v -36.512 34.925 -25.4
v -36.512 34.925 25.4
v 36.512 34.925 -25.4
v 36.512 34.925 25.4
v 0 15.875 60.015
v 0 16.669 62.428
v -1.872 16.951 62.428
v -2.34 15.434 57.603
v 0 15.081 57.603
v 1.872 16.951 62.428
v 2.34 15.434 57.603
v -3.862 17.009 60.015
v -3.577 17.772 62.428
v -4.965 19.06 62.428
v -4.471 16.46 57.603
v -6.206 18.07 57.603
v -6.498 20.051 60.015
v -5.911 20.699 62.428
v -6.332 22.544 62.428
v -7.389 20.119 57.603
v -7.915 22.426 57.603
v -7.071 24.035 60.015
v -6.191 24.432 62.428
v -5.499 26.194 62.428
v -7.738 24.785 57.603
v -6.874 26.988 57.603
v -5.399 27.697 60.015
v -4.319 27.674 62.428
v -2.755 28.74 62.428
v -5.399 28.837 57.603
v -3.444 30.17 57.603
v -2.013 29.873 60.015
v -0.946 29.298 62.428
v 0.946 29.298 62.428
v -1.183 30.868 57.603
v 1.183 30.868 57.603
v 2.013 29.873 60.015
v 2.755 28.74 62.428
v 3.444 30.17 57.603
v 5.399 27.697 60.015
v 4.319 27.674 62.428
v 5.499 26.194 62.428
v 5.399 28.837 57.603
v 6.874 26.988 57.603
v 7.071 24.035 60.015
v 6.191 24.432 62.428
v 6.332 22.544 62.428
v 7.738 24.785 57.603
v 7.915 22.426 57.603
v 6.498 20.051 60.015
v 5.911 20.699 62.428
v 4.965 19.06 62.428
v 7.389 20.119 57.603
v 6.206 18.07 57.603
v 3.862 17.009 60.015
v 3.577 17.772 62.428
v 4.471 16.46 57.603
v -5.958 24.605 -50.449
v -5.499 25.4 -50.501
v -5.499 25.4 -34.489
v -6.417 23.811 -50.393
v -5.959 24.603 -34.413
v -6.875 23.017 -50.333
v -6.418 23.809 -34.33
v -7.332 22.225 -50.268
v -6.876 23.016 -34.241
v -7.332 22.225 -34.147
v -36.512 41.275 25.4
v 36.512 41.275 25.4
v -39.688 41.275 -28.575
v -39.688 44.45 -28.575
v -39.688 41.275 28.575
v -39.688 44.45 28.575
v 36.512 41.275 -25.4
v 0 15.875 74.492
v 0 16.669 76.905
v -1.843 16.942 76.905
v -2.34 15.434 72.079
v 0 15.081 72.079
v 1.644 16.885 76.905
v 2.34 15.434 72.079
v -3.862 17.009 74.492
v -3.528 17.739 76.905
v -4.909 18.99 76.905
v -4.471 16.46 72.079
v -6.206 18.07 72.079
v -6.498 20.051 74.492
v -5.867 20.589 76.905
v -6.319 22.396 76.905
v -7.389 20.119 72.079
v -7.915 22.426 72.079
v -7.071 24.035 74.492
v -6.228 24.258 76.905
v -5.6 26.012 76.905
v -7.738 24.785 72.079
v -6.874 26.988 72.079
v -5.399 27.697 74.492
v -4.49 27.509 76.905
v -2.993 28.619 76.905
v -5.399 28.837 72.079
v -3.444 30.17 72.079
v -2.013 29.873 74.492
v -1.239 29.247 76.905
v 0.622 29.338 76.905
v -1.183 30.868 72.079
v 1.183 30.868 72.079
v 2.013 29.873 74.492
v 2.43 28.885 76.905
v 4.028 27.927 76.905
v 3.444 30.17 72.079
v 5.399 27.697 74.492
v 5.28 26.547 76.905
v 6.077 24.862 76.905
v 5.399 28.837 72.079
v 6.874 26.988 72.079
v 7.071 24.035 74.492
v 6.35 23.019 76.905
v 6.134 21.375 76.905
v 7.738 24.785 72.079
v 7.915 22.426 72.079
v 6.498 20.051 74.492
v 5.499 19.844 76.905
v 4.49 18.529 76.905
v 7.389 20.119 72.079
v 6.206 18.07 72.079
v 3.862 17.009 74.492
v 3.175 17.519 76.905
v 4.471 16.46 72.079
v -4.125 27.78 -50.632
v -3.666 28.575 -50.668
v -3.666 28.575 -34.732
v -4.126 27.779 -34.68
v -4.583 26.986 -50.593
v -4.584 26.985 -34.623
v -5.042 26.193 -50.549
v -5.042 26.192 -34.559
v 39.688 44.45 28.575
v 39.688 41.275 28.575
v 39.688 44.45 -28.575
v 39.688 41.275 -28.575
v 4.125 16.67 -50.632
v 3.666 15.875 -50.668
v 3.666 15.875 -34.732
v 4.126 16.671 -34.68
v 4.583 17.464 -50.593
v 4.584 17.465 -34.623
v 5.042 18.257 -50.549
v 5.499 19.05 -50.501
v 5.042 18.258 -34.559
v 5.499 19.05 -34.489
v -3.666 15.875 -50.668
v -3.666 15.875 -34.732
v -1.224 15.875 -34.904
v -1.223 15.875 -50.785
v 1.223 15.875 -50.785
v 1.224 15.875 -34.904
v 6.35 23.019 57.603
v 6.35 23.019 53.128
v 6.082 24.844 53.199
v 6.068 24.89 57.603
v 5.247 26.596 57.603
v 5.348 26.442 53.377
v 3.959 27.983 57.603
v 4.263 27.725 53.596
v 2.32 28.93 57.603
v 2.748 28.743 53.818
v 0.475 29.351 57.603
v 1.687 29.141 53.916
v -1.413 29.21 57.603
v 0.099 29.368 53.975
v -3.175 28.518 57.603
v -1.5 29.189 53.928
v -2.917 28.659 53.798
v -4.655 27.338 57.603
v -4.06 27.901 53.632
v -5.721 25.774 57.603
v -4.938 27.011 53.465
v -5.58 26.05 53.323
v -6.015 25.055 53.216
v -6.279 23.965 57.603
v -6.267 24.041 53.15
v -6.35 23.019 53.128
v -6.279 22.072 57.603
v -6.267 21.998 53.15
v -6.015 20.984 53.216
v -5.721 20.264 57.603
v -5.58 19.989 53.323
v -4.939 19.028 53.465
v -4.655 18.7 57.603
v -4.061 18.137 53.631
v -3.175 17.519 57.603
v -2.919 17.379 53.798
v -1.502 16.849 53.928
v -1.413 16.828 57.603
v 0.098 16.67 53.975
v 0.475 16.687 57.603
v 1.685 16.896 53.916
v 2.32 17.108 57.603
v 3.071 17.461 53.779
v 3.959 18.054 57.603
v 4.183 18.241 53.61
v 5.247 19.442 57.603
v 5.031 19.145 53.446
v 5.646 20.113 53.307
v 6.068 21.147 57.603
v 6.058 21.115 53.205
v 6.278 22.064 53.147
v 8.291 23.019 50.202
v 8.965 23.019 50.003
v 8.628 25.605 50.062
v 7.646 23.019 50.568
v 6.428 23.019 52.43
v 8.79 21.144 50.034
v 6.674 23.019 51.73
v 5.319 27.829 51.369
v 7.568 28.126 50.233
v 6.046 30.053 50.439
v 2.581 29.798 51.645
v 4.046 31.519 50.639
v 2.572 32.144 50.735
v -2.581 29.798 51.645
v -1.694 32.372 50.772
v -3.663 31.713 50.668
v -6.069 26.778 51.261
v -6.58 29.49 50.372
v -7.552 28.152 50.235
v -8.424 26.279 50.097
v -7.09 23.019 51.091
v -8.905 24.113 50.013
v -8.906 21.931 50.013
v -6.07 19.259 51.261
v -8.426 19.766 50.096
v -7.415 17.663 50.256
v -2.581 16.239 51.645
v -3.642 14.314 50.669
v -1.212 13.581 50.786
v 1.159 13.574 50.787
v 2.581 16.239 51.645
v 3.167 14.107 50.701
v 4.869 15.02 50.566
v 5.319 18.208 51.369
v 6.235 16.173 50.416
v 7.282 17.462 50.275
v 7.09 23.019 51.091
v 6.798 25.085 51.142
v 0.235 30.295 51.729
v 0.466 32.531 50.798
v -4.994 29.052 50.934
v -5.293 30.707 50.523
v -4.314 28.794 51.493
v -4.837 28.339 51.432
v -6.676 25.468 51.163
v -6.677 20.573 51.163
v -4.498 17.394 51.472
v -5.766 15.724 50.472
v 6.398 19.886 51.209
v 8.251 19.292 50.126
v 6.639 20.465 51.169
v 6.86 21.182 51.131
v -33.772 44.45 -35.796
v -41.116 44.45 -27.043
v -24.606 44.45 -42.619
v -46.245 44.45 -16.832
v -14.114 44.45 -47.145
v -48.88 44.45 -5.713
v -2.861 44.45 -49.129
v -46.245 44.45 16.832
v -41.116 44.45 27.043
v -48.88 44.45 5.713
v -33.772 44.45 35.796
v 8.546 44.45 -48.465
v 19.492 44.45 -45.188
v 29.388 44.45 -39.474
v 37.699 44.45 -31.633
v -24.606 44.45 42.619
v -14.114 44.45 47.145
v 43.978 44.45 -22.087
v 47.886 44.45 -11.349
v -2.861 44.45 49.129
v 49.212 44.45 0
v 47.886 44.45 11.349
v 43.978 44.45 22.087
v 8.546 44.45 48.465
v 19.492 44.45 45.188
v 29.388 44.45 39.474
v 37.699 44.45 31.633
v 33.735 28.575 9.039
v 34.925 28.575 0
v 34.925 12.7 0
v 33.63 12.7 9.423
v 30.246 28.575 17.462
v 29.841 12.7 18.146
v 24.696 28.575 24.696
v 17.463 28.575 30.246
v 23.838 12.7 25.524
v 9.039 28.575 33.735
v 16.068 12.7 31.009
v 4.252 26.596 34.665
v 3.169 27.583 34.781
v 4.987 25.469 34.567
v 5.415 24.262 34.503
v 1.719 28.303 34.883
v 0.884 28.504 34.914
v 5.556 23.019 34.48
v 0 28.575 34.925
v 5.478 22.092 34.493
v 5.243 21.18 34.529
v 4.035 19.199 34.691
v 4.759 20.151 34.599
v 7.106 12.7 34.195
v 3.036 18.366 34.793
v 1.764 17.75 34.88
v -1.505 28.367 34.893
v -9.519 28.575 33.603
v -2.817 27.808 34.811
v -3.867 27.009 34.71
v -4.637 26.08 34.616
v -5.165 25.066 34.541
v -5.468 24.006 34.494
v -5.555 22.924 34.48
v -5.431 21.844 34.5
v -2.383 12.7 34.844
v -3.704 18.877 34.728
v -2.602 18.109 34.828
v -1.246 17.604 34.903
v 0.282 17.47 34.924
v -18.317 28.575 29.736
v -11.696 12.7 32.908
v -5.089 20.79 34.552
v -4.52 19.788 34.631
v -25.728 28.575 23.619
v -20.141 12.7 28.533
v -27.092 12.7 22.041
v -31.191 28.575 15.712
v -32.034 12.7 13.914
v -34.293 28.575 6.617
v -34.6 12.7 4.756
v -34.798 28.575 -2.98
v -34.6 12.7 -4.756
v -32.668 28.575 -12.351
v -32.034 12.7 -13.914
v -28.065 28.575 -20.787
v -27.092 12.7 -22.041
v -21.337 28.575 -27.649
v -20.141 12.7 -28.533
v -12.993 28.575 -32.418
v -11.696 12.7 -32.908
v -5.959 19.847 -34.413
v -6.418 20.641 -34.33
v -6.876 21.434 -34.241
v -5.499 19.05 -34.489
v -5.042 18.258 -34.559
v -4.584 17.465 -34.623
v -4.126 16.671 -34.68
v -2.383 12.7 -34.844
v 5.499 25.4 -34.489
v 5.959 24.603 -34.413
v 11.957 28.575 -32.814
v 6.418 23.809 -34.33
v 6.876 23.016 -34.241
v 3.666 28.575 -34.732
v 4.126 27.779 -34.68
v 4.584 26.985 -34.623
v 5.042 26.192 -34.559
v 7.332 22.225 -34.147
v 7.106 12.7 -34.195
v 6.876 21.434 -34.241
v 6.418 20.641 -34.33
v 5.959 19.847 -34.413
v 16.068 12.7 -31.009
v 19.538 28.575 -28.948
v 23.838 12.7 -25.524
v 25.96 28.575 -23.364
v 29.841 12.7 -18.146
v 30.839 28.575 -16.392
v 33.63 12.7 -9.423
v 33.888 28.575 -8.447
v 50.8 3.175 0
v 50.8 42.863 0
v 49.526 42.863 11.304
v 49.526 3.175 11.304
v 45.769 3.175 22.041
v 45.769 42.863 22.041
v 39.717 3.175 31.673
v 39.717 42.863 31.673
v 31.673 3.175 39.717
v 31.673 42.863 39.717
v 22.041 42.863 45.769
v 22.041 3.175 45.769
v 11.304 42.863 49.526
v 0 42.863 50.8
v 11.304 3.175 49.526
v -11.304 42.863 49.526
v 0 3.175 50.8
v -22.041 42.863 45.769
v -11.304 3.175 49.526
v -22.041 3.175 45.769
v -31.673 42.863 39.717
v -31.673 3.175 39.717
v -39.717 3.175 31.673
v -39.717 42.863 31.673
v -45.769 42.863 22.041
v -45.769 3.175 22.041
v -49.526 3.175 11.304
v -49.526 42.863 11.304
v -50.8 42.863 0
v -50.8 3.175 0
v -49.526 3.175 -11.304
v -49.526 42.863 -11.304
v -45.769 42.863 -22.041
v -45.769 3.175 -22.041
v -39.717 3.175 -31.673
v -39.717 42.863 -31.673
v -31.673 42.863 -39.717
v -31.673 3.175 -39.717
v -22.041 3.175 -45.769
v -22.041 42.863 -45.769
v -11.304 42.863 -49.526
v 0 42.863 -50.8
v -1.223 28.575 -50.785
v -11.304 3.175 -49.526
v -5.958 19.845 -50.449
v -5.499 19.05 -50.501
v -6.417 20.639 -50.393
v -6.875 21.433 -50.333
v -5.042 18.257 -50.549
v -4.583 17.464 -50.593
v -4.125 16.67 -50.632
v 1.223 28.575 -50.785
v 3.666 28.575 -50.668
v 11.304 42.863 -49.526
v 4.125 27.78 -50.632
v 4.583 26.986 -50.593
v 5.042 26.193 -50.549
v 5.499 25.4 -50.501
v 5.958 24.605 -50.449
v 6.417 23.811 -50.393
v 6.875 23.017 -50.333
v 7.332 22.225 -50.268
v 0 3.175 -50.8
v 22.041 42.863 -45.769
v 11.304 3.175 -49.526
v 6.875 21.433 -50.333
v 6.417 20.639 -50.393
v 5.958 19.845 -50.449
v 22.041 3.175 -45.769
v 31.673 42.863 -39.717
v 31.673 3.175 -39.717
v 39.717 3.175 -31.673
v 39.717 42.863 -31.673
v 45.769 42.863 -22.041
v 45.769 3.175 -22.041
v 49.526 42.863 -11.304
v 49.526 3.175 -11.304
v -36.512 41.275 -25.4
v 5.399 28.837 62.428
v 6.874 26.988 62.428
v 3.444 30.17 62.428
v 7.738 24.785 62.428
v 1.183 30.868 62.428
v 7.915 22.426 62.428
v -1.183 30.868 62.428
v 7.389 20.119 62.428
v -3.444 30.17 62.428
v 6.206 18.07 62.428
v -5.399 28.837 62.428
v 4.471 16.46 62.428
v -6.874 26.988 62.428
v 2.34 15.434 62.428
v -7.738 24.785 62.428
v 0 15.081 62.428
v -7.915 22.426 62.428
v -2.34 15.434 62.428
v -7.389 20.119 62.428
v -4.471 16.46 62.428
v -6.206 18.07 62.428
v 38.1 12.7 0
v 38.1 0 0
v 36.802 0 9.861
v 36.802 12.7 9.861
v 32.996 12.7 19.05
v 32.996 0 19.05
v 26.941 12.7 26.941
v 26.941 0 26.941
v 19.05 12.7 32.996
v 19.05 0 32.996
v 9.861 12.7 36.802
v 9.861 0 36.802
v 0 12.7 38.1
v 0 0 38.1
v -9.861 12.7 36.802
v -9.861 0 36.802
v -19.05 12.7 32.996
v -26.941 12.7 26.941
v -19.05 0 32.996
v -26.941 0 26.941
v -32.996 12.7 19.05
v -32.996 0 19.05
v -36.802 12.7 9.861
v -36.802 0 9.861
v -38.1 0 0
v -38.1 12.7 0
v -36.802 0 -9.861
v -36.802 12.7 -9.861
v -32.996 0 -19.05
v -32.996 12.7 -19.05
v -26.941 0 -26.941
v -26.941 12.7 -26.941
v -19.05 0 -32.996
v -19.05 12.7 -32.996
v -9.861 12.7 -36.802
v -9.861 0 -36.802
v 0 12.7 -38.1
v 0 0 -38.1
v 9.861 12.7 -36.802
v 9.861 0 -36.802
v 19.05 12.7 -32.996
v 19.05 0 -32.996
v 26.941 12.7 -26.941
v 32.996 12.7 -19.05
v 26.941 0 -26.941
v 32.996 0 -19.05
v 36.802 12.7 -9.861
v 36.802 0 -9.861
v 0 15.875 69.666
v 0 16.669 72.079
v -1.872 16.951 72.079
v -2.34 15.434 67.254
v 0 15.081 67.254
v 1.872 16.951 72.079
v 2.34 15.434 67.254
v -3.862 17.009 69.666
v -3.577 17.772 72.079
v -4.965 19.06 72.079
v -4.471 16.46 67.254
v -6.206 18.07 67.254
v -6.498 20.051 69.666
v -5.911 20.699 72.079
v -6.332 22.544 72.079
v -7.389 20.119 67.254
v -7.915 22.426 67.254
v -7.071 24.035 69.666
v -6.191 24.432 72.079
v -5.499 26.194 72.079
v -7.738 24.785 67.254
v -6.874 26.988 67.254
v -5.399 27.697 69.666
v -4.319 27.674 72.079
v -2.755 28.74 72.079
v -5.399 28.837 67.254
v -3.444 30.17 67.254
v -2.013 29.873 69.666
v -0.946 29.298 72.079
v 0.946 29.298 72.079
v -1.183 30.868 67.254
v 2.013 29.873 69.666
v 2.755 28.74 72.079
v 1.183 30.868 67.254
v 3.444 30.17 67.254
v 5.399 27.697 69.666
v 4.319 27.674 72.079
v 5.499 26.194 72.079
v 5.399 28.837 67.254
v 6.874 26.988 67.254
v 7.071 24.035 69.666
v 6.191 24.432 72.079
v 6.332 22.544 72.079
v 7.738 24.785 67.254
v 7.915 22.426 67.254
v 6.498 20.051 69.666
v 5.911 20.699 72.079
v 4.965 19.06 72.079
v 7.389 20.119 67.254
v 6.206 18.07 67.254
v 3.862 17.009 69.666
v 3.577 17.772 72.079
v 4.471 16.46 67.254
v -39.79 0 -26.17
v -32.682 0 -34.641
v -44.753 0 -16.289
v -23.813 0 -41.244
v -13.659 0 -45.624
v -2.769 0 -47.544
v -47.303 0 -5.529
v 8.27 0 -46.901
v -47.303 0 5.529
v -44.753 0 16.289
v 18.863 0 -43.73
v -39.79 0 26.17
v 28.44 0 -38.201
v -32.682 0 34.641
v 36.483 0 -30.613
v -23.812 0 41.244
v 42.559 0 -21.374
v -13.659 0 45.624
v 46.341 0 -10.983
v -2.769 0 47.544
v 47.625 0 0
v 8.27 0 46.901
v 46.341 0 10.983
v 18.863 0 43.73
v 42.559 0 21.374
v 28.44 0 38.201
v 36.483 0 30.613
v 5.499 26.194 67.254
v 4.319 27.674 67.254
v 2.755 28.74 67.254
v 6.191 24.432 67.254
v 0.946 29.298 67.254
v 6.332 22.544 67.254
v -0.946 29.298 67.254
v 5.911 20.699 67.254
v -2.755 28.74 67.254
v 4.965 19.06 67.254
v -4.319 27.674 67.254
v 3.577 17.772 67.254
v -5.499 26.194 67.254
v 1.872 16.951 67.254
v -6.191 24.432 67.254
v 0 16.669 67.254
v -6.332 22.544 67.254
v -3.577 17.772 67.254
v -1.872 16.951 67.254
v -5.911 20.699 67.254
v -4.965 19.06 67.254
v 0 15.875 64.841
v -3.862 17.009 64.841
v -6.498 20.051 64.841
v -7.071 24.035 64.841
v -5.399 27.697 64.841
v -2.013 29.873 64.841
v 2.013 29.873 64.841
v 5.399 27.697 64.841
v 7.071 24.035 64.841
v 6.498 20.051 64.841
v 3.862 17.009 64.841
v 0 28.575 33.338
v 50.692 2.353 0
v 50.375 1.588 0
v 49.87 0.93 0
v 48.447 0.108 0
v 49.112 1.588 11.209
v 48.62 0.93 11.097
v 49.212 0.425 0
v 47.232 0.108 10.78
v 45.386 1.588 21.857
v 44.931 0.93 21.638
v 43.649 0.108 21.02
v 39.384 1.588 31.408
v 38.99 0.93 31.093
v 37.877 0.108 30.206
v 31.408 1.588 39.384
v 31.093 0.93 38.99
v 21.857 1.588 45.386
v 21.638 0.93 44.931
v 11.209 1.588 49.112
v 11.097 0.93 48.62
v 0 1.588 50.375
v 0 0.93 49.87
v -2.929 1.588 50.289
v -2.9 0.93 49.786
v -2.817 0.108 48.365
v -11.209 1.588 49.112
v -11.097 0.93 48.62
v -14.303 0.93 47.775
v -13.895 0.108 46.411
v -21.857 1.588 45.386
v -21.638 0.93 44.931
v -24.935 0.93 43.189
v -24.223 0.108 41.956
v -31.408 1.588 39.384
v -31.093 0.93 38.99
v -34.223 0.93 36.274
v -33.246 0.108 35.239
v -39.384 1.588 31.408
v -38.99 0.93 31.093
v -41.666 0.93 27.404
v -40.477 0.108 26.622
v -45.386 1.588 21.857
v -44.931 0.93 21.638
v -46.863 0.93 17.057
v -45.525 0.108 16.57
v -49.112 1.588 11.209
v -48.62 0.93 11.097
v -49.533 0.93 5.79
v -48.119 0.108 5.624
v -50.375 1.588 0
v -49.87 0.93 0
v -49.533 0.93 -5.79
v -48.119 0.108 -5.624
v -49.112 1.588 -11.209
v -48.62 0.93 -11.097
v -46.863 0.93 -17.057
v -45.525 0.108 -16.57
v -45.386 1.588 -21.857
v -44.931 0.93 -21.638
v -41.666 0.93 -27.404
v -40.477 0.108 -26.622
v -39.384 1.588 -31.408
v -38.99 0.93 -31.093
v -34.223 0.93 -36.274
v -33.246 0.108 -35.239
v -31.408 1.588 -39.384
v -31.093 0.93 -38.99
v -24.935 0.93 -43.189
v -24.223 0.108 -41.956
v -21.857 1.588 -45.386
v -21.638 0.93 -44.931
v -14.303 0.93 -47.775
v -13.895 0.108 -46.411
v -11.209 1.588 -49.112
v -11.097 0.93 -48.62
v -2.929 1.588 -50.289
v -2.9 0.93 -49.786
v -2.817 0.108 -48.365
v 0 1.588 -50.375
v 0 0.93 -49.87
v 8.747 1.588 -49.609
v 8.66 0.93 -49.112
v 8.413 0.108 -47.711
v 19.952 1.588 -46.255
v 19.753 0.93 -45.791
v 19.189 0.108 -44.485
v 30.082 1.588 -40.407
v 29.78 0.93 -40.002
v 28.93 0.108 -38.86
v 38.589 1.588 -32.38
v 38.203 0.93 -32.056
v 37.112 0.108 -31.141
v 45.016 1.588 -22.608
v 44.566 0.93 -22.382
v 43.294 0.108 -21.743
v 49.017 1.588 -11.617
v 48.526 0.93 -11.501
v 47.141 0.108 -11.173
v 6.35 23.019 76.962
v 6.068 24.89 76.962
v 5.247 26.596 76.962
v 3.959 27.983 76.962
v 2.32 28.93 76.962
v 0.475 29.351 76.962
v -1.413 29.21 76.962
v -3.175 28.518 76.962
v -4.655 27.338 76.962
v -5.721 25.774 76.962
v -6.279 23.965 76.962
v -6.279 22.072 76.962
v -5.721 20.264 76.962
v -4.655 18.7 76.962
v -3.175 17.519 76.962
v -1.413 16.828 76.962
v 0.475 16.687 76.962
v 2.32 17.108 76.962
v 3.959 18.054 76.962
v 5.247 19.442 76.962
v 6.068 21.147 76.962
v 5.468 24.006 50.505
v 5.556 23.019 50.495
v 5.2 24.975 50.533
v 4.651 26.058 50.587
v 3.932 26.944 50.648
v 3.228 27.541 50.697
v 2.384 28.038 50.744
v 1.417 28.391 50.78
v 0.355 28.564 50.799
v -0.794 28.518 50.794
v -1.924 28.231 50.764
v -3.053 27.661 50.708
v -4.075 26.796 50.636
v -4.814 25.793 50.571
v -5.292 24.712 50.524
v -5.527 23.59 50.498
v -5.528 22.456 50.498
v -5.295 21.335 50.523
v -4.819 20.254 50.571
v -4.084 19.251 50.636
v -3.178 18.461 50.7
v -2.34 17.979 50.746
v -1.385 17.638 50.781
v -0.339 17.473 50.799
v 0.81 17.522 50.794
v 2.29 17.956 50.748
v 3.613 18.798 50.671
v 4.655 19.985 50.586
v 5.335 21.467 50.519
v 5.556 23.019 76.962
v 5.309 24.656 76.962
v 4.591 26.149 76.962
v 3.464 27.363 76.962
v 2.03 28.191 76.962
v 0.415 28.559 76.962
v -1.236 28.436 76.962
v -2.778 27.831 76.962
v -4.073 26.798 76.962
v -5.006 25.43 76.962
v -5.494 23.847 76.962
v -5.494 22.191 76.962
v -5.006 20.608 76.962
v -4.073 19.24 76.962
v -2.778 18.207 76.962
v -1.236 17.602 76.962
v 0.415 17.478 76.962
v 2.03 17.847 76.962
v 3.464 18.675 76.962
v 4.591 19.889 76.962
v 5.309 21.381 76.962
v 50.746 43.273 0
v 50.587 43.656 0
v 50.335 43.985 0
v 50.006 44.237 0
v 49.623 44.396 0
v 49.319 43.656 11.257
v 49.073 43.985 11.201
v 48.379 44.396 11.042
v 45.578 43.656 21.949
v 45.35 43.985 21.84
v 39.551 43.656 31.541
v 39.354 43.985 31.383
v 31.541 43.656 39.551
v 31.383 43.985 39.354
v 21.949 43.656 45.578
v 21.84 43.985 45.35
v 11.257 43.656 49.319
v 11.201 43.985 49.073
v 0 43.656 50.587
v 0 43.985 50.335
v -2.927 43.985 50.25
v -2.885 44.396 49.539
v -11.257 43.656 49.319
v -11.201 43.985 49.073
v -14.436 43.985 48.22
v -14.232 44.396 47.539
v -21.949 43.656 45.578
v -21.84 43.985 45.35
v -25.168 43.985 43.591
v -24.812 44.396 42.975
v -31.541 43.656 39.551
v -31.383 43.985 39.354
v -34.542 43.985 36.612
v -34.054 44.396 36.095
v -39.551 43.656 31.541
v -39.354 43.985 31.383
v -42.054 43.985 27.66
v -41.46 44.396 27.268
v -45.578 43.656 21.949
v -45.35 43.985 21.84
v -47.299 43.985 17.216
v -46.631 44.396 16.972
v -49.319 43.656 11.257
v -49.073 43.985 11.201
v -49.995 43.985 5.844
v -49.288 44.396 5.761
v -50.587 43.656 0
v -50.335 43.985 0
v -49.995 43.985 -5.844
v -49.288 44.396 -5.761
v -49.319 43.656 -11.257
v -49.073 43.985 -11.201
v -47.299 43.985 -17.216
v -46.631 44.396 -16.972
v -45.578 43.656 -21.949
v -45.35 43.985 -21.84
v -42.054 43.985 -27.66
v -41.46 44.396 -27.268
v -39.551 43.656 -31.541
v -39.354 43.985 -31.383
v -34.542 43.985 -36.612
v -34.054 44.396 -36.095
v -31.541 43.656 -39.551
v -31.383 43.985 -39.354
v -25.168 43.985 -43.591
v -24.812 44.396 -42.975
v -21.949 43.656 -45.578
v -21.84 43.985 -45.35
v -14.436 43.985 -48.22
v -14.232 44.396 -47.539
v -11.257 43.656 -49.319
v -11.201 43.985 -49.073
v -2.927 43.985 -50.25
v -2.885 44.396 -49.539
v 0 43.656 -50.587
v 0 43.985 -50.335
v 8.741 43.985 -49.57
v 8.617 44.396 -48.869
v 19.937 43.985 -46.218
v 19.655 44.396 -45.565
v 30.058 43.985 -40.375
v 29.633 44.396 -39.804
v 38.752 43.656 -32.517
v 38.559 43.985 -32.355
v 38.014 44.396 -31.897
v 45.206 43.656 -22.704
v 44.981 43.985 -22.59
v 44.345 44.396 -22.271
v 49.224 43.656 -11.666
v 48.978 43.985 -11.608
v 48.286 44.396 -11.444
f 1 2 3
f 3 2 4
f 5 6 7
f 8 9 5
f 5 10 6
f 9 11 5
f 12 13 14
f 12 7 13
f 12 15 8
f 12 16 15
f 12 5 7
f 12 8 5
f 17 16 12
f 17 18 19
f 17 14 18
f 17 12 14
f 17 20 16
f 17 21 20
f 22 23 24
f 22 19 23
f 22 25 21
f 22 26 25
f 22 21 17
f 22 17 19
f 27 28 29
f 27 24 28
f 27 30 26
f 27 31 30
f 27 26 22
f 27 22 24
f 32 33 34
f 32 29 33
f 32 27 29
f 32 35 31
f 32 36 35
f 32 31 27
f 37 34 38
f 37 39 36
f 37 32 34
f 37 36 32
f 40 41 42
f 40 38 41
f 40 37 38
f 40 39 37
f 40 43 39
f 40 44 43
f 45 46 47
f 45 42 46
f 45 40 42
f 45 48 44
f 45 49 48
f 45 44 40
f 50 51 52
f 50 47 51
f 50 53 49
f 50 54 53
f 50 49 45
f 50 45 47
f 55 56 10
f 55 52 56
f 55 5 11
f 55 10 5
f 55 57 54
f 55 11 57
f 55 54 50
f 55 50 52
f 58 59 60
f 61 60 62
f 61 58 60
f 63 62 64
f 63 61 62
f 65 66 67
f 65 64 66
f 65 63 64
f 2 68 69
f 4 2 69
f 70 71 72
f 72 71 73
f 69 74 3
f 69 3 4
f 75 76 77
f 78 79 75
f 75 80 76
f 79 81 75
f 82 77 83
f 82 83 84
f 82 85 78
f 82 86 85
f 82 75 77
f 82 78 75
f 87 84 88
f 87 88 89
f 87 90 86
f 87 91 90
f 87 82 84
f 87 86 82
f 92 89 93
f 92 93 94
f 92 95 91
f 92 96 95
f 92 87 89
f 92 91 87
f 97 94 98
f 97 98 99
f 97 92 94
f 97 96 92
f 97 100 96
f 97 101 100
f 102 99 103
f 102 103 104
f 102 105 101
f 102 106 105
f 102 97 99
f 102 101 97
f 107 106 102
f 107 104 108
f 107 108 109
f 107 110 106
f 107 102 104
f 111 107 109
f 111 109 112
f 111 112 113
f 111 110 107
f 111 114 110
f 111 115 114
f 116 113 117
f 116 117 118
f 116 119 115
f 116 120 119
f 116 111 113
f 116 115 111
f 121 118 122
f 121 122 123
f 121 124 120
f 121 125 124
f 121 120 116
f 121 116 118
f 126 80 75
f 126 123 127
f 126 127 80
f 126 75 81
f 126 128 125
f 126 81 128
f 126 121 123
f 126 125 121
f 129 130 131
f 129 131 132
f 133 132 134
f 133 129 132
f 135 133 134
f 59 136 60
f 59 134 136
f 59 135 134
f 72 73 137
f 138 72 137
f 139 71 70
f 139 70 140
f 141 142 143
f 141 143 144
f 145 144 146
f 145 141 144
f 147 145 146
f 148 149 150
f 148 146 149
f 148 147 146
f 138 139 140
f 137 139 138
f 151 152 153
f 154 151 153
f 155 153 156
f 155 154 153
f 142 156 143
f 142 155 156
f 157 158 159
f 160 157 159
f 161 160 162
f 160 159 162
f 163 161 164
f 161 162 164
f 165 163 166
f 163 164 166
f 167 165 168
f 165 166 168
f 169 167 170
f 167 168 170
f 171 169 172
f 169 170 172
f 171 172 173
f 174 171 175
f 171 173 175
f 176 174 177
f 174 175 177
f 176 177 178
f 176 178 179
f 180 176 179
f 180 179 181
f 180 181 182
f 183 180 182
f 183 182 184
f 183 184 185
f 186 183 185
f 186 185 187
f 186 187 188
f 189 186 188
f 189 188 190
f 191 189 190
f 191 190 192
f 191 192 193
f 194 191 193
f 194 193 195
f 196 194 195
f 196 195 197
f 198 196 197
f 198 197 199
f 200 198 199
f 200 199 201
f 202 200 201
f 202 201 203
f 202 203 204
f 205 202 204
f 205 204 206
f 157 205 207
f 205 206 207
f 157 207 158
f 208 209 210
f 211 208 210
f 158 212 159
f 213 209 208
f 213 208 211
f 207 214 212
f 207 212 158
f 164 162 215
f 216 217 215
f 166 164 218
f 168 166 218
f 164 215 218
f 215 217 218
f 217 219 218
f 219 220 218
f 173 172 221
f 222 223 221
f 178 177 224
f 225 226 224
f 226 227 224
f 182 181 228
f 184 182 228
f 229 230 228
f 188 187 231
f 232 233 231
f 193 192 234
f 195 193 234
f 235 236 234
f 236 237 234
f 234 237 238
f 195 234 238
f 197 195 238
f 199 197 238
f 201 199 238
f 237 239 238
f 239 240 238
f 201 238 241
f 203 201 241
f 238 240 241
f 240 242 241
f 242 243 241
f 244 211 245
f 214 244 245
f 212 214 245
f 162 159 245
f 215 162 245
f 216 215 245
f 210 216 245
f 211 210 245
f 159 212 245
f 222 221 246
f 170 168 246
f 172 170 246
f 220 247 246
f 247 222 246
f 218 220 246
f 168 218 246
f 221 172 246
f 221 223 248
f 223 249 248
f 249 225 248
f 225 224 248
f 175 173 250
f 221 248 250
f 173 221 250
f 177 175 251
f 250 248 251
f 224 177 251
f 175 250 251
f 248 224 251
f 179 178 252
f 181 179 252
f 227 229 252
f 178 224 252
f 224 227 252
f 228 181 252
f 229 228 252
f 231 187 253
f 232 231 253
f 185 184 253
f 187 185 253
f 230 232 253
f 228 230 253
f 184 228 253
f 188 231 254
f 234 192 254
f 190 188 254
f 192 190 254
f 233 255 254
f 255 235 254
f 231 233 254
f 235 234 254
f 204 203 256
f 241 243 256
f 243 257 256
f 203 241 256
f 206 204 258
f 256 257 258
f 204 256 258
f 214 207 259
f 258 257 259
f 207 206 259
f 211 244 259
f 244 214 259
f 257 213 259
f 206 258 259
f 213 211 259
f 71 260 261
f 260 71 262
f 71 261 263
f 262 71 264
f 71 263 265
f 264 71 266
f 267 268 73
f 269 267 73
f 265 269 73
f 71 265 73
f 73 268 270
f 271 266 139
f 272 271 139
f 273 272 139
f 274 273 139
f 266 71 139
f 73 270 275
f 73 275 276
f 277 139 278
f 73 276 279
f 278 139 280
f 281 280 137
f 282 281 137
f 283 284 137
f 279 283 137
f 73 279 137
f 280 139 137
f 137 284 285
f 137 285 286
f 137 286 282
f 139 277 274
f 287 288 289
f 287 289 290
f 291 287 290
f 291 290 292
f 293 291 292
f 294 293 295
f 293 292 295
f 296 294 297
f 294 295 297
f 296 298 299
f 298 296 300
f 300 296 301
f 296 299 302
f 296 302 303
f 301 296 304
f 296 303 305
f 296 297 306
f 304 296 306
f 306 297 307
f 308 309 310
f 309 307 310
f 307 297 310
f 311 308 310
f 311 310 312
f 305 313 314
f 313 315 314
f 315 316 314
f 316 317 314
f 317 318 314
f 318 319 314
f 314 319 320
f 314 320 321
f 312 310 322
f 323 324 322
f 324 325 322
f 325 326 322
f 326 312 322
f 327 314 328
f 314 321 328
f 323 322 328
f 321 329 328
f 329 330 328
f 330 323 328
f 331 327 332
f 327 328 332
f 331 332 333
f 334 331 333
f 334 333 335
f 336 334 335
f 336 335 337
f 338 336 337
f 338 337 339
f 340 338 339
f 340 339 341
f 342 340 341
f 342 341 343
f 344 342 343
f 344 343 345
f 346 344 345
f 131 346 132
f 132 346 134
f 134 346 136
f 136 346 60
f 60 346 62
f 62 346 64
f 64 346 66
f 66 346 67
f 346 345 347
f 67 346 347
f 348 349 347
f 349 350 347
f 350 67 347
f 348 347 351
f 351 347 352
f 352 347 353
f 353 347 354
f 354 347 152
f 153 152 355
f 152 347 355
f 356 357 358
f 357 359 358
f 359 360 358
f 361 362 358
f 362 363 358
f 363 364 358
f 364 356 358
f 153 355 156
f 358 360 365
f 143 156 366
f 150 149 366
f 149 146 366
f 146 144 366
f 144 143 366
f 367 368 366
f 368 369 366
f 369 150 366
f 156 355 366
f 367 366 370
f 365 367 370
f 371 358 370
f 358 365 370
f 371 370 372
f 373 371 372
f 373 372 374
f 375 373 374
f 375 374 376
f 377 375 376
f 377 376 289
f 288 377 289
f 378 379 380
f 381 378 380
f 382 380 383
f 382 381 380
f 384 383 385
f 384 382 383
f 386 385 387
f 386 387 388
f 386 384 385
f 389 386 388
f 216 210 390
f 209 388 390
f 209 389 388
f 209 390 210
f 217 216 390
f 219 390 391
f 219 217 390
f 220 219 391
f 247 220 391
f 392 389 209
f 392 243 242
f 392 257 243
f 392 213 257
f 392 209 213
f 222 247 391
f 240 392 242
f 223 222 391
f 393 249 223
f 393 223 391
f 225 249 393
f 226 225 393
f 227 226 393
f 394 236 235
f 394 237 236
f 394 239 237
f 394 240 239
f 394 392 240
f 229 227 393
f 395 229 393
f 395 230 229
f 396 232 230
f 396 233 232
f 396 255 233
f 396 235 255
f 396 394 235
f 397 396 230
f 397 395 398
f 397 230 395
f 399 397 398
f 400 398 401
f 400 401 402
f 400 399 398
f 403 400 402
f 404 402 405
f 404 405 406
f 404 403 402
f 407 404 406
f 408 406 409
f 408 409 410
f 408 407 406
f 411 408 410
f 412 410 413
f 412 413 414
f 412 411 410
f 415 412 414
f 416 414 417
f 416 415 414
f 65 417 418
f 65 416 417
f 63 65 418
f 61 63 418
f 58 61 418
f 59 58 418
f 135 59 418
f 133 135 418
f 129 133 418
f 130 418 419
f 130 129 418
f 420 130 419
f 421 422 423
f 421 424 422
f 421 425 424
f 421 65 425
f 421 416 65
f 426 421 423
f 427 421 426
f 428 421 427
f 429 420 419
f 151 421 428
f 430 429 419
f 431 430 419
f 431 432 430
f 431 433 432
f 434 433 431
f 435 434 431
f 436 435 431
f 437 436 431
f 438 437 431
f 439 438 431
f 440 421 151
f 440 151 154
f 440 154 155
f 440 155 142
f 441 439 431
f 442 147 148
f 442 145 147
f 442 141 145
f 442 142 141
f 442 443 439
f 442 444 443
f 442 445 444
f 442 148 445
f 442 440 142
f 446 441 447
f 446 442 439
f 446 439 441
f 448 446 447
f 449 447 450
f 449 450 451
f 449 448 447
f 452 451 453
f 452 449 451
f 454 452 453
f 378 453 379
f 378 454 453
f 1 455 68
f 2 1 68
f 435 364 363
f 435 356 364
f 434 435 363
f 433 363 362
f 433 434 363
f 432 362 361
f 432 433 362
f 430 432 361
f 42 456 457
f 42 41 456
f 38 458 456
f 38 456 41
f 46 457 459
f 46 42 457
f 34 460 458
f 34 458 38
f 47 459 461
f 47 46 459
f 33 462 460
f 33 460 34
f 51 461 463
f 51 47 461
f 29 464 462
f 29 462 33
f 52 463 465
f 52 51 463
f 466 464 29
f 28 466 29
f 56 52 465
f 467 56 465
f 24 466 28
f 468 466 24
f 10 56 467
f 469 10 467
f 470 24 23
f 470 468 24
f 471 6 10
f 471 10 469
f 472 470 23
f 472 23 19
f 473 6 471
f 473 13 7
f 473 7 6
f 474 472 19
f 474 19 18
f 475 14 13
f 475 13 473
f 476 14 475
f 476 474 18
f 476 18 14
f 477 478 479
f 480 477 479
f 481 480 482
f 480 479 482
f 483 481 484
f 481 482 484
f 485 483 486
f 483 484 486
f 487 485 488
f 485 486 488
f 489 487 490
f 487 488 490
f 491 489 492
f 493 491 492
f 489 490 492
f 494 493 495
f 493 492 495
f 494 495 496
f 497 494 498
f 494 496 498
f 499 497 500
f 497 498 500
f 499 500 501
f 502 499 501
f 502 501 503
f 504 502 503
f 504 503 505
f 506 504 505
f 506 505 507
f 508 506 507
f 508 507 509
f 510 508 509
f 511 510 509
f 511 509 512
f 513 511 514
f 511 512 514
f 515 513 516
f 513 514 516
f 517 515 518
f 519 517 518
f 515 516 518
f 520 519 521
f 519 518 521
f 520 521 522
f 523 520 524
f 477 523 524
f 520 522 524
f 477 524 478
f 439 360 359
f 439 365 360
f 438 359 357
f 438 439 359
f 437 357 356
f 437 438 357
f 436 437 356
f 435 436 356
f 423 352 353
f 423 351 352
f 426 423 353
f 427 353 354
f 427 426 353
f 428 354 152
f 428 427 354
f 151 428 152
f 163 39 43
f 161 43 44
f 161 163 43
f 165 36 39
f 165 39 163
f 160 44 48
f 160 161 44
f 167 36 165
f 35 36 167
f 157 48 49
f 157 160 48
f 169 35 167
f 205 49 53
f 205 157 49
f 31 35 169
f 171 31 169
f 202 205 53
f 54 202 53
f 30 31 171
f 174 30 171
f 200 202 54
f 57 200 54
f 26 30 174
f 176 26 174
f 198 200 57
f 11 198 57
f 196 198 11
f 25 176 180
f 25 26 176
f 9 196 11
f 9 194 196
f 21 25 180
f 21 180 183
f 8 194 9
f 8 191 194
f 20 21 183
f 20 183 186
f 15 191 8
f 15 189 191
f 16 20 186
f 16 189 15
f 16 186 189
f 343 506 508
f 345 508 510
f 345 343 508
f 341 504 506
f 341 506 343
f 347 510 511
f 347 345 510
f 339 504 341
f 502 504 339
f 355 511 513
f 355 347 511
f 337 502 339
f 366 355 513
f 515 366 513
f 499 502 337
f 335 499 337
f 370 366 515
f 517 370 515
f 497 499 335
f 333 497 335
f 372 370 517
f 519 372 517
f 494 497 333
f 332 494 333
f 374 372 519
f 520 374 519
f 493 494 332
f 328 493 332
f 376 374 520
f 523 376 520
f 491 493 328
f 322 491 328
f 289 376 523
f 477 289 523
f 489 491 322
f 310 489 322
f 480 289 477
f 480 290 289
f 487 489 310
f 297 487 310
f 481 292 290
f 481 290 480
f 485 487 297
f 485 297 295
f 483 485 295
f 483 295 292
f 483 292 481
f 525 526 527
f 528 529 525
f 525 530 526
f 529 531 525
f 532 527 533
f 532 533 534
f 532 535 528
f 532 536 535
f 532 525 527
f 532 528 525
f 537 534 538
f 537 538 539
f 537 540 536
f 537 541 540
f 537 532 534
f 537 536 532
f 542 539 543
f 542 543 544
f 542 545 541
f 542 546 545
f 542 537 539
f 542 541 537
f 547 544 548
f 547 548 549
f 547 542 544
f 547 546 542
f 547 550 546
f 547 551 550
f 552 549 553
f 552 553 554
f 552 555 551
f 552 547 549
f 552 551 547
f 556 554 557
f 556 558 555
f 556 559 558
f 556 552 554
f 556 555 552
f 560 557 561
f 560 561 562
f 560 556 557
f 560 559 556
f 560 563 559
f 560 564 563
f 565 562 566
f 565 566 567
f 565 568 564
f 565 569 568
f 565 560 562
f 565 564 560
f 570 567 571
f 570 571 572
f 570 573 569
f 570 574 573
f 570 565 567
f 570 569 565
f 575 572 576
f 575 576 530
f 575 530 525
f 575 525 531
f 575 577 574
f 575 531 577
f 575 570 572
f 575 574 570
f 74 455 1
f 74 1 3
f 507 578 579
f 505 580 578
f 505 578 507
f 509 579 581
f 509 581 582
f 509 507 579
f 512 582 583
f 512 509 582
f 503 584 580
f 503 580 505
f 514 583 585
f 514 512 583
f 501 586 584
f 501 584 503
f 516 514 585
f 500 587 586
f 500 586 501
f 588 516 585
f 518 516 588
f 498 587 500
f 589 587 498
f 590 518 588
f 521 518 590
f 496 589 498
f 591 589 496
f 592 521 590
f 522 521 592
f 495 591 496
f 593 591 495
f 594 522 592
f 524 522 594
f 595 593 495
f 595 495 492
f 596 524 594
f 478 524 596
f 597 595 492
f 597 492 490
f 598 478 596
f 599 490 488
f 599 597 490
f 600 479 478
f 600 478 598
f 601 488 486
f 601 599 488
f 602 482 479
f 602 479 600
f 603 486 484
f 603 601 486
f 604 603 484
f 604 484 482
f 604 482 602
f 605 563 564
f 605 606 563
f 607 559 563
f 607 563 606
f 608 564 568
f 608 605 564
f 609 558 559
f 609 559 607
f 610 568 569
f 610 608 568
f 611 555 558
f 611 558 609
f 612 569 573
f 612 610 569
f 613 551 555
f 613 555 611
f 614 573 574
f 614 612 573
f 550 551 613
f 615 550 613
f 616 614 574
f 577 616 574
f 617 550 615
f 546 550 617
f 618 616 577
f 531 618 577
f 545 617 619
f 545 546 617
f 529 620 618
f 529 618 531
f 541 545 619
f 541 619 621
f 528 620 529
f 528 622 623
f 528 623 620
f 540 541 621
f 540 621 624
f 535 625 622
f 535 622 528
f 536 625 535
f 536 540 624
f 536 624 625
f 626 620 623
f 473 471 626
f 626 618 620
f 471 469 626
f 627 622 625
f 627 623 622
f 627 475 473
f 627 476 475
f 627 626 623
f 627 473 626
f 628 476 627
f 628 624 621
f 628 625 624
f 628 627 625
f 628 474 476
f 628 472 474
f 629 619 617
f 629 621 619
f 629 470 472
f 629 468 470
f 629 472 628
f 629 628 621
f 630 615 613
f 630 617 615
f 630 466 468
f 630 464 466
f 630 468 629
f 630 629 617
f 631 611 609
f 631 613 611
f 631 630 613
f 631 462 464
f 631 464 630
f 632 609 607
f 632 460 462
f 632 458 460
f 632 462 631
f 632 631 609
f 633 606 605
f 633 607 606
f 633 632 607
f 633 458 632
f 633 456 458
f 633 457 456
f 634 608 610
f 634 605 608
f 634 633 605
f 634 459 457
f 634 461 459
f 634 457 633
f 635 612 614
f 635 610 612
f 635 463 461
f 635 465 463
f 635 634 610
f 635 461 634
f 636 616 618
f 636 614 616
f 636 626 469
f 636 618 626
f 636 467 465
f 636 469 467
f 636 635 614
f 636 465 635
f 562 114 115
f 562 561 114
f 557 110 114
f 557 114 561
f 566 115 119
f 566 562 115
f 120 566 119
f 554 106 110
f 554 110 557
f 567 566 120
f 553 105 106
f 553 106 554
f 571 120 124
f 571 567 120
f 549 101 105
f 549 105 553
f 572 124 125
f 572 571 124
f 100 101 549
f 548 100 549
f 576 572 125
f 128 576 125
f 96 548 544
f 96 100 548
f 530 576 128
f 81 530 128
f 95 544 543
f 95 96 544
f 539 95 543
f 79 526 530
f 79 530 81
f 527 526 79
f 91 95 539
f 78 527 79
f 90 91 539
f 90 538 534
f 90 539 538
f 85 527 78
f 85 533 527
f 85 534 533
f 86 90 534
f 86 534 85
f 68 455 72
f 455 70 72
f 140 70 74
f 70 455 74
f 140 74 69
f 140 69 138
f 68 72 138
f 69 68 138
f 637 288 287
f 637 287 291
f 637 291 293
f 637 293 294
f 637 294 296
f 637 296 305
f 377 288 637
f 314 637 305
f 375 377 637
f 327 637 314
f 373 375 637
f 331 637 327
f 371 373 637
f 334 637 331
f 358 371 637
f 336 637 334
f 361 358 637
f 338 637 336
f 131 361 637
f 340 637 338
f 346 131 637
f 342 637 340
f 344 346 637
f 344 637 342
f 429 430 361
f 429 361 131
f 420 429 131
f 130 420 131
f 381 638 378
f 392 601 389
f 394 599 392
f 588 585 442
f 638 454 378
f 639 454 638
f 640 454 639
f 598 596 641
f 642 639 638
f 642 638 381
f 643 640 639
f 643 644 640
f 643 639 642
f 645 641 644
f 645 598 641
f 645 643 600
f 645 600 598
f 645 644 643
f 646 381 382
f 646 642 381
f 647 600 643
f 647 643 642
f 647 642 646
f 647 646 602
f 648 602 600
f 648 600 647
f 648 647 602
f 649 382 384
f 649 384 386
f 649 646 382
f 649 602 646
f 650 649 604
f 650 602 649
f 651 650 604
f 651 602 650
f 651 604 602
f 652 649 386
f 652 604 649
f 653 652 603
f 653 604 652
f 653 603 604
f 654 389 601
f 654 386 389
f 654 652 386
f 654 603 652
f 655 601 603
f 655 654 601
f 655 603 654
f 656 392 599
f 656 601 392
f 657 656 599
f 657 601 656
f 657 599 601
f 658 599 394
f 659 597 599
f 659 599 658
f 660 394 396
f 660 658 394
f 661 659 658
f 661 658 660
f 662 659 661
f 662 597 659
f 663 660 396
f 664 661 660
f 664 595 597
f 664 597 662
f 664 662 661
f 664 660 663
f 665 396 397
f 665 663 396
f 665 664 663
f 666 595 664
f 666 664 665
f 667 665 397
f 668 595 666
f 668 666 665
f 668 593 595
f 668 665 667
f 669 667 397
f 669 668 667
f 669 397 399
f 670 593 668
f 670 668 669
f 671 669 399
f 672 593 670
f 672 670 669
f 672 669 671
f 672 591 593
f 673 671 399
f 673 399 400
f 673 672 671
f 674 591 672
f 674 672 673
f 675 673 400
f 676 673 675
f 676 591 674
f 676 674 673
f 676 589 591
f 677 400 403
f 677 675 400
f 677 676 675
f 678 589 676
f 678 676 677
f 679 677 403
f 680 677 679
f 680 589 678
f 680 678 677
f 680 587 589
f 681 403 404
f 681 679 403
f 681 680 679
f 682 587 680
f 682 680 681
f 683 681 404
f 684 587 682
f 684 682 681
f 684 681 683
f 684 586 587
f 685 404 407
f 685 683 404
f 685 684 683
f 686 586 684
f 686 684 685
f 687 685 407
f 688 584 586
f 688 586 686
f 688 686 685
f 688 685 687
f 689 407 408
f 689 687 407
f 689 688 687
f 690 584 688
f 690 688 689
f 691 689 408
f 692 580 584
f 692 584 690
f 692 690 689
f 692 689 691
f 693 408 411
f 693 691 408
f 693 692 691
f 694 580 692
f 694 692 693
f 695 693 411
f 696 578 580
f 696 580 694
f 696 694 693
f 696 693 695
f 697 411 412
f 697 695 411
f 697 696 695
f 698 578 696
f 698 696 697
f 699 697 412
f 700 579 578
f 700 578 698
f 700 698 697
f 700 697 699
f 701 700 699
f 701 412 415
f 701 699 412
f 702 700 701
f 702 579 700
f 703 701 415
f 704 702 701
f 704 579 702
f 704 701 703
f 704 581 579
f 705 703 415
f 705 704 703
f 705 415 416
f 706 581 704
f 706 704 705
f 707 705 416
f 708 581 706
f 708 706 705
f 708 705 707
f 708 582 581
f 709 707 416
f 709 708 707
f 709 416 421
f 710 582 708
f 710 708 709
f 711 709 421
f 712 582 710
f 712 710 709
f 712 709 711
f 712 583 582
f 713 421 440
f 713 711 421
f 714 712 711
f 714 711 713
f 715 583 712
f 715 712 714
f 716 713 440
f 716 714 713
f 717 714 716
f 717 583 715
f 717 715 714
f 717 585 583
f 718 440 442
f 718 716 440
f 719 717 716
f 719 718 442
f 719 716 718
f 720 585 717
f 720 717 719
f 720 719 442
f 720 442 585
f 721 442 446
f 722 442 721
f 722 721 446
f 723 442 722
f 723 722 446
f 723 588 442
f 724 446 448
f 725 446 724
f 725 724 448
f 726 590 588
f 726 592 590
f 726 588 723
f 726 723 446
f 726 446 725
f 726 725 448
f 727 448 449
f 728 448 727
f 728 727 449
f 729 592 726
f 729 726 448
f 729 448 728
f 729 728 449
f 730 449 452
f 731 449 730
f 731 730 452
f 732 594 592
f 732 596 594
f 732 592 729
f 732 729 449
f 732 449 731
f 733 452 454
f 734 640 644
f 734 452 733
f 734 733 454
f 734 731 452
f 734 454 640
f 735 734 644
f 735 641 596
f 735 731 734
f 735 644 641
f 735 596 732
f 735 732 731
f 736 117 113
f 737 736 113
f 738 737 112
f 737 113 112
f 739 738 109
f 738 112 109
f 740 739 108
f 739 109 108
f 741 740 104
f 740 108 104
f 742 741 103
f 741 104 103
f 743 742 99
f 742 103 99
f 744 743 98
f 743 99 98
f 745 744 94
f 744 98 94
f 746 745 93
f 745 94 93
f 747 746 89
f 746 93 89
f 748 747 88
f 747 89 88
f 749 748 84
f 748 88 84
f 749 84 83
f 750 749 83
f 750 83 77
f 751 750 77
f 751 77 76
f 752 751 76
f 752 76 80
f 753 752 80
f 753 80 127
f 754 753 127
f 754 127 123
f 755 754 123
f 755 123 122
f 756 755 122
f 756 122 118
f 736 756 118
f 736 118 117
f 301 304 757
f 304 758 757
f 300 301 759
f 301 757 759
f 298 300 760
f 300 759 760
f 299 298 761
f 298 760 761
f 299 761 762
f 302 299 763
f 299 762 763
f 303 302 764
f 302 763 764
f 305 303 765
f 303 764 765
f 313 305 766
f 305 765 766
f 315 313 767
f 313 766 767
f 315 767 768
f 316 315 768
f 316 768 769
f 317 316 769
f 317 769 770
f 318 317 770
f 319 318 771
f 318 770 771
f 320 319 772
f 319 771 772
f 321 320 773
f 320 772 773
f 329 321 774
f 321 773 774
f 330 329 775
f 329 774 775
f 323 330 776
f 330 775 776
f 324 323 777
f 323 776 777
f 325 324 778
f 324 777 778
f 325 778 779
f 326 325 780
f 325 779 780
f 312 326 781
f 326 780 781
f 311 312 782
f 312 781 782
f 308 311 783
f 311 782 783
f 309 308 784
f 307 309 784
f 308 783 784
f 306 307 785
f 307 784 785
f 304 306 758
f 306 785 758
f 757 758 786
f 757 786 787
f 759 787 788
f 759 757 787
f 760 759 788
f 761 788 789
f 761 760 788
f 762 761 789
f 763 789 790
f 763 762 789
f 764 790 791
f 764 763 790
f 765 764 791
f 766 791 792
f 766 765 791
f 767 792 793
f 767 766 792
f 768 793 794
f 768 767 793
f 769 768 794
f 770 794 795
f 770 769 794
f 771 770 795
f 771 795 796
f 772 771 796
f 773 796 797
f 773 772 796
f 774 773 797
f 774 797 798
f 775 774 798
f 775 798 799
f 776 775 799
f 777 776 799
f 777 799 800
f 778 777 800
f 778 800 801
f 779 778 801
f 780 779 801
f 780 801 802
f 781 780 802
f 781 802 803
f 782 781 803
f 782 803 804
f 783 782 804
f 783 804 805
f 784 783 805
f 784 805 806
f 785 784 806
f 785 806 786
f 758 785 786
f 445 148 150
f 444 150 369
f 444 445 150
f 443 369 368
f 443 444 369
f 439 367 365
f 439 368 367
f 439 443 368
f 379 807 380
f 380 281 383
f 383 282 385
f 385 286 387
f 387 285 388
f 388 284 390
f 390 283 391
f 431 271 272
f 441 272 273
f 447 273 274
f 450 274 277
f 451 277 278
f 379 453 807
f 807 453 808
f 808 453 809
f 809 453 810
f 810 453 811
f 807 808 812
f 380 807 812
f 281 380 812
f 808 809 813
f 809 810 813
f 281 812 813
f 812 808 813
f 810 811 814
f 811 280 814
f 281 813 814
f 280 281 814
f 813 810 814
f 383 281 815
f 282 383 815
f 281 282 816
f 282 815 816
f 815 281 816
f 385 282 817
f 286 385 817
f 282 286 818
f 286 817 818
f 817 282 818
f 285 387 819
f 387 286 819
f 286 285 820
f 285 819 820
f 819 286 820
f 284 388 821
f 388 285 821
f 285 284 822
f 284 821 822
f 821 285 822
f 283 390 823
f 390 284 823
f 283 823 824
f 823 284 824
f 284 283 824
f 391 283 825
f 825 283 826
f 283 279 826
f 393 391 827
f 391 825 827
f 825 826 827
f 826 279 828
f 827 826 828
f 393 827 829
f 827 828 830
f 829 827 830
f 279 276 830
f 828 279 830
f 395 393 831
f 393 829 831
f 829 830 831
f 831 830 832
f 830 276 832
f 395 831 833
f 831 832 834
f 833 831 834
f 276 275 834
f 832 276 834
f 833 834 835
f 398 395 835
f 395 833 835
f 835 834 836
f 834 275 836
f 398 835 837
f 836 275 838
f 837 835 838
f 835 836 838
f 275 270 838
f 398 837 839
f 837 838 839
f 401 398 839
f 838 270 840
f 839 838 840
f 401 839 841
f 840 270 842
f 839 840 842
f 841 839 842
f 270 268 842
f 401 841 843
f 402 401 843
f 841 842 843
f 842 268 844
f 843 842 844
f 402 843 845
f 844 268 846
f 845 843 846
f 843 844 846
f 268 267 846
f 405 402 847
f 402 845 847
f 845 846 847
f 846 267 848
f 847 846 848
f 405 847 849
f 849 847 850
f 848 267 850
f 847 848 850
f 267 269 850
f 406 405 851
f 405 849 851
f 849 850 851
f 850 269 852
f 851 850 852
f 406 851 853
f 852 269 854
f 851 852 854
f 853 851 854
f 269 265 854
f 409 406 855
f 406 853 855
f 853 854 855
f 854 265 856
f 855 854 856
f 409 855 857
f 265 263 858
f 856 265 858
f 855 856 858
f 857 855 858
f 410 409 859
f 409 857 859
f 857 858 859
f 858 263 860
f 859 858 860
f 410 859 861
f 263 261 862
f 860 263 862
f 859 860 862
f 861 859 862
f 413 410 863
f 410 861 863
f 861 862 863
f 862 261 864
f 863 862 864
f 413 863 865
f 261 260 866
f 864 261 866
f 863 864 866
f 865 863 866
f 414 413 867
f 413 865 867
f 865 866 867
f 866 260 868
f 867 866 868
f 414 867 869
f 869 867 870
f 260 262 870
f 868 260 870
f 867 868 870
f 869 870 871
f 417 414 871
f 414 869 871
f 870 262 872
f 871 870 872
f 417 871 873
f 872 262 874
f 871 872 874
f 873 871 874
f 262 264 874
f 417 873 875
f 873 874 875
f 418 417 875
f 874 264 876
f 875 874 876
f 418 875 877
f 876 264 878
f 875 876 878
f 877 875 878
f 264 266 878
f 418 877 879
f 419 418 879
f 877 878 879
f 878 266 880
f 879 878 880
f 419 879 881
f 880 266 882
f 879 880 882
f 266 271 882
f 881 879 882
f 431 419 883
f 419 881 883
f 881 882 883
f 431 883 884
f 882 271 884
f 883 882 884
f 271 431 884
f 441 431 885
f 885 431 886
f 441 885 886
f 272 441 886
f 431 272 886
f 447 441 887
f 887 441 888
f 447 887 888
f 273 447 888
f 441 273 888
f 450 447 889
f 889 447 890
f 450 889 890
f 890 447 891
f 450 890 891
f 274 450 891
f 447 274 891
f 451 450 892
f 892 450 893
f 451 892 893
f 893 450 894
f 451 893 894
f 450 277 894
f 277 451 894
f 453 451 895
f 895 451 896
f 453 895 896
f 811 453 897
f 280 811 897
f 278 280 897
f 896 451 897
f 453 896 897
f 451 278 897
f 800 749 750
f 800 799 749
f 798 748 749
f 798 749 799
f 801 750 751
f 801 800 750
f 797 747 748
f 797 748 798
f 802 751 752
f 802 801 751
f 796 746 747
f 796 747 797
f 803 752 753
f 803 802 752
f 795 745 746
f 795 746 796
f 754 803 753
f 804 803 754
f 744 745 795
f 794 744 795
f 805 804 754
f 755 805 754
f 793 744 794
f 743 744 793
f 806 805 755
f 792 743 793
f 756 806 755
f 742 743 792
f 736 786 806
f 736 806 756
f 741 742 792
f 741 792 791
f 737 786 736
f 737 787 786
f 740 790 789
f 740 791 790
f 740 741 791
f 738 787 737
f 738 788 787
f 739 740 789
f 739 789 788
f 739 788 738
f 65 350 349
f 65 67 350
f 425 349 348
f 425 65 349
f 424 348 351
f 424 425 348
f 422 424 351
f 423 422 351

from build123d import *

# Parameters (mm, degrees)
F0_R           = 50.8
F1_DEPTH       = 44.45
F2_R           = 34.925
F3_DEPTH       = 28.575
F4_R           = 38.1
F5_DEPTH       = 12.7
F8_R           = 3.175
F9_R           = 1.5875
F12_DEPTH      = 25.4
F13_R          = 5.55625
F14_DEPTH      = 17.4625
F15_R          = 6.35
F15_R_2        = 5.55625
F16_DEPTH      = 26.67
F20_R          = 3.175
F22_W          = 73.025
F22_H          = 50.8
F23_DEPTH      = 9.525
F22_W_2        = 79.375
F22_H_2        = 57.15
F24_DEPTH      = 3.175
F24_DEPTH_BACK = 25.4


with BuildPart() as f1:
    # F0 (on Front) → F1 (new body)
    with BuildSketch(Plane.XZ):
        Circle(F0_R)
    extrude(amount=-F1_DEPTH)

    # F2 (on Front) → F3 (cut)
    with BuildSketch(Plane.XZ):
        Circle(F2_R)
    extrude(amount=-F3_DEPTH, mode=Mode.SUBTRACT)

    # F4 (on Front) → F5 (cut)
    with BuildSketch(Plane.XZ):
        Circle(F4_R)
    extrude(amount=-F5_DEPTH, mode=Mode.SUBTRACT)

    # F8
    f8_edges = [f1.edges().sort_by_distance(p)[0] for p in [
        (-50.8, 0, 0),
    ]]
    fillet(f8_edges, radius=F8_R)

    # F9
    f9_edges = [f1.edges().sort_by_distance(p)[0] for p in [
        (-50.8, 44.45, 0),
    ]]
    fillet(f9_edges, radius=F9_R)

    # F11 (on offset) → F12 (cut)
    with BuildSketch(Plane.XY.offset(-50.8)):
        with BuildLine():
            ThreePointArc((5.4992612052, 19.0499998116), (6.1336289688, 20.5814989585), (6.35, 22.225))
            ThreePointArc((6.35, 22.225), (6.1336290298, 23.8685008137), (5.4992614411, 25.3999997799))
            ThreePointArc((5.4992614411, 25.3999997799), (3.17500011, 27.7242612505), (0, 28.575))
            ThreePointArc((0, 28.575), (-3.1749999058, 27.7242613684), (-5.4992612052, 25.4000001884))
            ThreePointArc((-5.4992612052, 25.4000001884), (-6.35, 22.2249999281), (-5.4992611333, 19.049999687))
            ThreePointArc((-5.4992611333, 19.049999687), (-3.1749998435, 16.7257385956), (0, 15.875))
            ThreePointArc((0, 15.875), (3.1749999058, 16.7257386316), (5.4992612052, 19.0499998116))
        make_face()
        with BuildLine():
            ThreePointArc((0, 28.575), (3.17500011, 27.7242612505), (5.4992614411, 25.3999997799))
            Line((5.4992614411, 25.3999997799), (3.6661742094, 28.575))
            Line((3.6661742094, 28.575), (0, 28.575))
        make_face()
        with BuildLine():
            ThreePointArc((-5.4992612052, 25.4000001884), (-3.1749999058, 27.7242613684), (0, 28.575))
            Line((0, 28.575), (-3.6661742094, 28.575))
            Line((-3.6661742094, 28.575), (-5.4992612052, 25.4000001884))
        make_face()
        with BuildLine():
            ThreePointArc((-5.4992611333, 19.049999687), (-6.35, 22.2249999281), (-5.4992612052, 25.4000001884))
            Line((-5.4992612052, 25.4000001884), (-7.3323484187, 22.225))
            Line((-7.3323484187, 22.225), (-5.4992611333, 19.049999687))
        make_face()
        with BuildLine():
            Line((-3.6661742094, 15.875), (0, 15.875))
            ThreePointArc((0, 15.875), (-3.1749998435, 16.7257385956), (-5.4992611333, 19.049999687))
            Line((-5.4992611333, 19.049999687), (-3.6661742094, 15.875))
        make_face()
        with BuildLine():
            Line((3.6661742094, 15.875), (5.4992612052, 19.0499998116))
            ThreePointArc((5.4992612052, 19.0499998116), (3.1749999058, 16.7257386316), (0, 15.875))
            Line((0, 15.875), (3.6661742094, 15.875))
        make_face()
        with BuildLine():
            ThreePointArc((5.4992614411, 25.3999997799), (6.1336290298, 23.8685008137), (6.35, 22.225))
            ThreePointArc((6.35, 22.225), (6.1336289688, 20.5814989585), (5.4992612052, 19.0499998116))
            Line((5.4992612052, 19.0499998116), (7.3323484187, 22.225))
            Line((7.3323484187, 22.225), (5.4992614411, 25.3999997799))
        make_face()
    extrude(amount=F12_DEPTH, mode=Mode.SUBTRACT)

    # F13 (on offset) → F14 (cut)
    with BuildSketch(Plane.XY.offset(50.8)):
        with Locations((0, 23.01875)):
            Circle(F13_R)
    extrude(amount=-F14_DEPTH, mode=Mode.SUBTRACT)


with BuildPart() as f16:
    # F15 (on offset) → F16 (new body)
    with BuildSketch(Plane.XY.offset(50.8)):
        with Locations((0, 23.01875)):
            Circle(F15_R)
        with Locations((0, 23.01875)):
            Circle(F15_R_2, mode=Mode.SUBTRACT)
    extrude(amount=F16_DEPTH)


with BuildPart() as f16_1:
    # F18: moved
    add(f16.part.moved(Location((0, 0, -0.508))))

    # F19: union F1
    add(f1.part)

    # F20
    f20_edges = [f16_1.edges().sort_by_distance(p)[0] for p in [
        (-6.35, 23.01875, 50.401562),
    ]]
    fillet(f20_edges, radius=F20_R)

    # F17 (on Right) → F21 (revolve)
    with BuildSketch(Plane.YZ):
        Polygon((16.66875, 67.2536837804), (16.66875, 72.0792659992), (15.08125, 67.2536837804), align=None)
        Polygon((16.66875, 62.4281015617), (16.66875, 67.2536837804), (15.08125, 62.4281015617), align=None)
        Polygon((16.66875, 57.6025193429), (16.66875, 62.4281015617), (15.08125, 57.6025193429), align=None)
        Polygon((16.66875, 72.0792659992), (16.66875, 76.904848218), (15.08125, 72.0792659992), align=None)
    revolve(axis=Axis((0, 23.01875, 64.9531239529), (0, 0, -1)))

    # F22 (on offset) → F23 (cut)
    with BuildSketch(Plane.XZ.offset(-44.45)):
        Rectangle(F22_W, F22_H)
    extrude(amount=F23_DEPTH, mode=Mode.SUBTRACT)

    # F22 (on offset) → F24 (cut, two sides)
    with BuildSketch(Plane.XZ.offset(-44.45)) as f24_sk:
        Rectangle(F22_W_2, F22_H_2)
        Rectangle(F22_W, F22_H, mode=Mode.SUBTRACT)
    extrude(amount=F24_DEPTH, mode=Mode.SUBTRACT)
    extrude(f24_sk.sketch, amount=-F24_DEPTH_BACK, mode=Mode.SUBTRACT)


solid = f16_1.part
